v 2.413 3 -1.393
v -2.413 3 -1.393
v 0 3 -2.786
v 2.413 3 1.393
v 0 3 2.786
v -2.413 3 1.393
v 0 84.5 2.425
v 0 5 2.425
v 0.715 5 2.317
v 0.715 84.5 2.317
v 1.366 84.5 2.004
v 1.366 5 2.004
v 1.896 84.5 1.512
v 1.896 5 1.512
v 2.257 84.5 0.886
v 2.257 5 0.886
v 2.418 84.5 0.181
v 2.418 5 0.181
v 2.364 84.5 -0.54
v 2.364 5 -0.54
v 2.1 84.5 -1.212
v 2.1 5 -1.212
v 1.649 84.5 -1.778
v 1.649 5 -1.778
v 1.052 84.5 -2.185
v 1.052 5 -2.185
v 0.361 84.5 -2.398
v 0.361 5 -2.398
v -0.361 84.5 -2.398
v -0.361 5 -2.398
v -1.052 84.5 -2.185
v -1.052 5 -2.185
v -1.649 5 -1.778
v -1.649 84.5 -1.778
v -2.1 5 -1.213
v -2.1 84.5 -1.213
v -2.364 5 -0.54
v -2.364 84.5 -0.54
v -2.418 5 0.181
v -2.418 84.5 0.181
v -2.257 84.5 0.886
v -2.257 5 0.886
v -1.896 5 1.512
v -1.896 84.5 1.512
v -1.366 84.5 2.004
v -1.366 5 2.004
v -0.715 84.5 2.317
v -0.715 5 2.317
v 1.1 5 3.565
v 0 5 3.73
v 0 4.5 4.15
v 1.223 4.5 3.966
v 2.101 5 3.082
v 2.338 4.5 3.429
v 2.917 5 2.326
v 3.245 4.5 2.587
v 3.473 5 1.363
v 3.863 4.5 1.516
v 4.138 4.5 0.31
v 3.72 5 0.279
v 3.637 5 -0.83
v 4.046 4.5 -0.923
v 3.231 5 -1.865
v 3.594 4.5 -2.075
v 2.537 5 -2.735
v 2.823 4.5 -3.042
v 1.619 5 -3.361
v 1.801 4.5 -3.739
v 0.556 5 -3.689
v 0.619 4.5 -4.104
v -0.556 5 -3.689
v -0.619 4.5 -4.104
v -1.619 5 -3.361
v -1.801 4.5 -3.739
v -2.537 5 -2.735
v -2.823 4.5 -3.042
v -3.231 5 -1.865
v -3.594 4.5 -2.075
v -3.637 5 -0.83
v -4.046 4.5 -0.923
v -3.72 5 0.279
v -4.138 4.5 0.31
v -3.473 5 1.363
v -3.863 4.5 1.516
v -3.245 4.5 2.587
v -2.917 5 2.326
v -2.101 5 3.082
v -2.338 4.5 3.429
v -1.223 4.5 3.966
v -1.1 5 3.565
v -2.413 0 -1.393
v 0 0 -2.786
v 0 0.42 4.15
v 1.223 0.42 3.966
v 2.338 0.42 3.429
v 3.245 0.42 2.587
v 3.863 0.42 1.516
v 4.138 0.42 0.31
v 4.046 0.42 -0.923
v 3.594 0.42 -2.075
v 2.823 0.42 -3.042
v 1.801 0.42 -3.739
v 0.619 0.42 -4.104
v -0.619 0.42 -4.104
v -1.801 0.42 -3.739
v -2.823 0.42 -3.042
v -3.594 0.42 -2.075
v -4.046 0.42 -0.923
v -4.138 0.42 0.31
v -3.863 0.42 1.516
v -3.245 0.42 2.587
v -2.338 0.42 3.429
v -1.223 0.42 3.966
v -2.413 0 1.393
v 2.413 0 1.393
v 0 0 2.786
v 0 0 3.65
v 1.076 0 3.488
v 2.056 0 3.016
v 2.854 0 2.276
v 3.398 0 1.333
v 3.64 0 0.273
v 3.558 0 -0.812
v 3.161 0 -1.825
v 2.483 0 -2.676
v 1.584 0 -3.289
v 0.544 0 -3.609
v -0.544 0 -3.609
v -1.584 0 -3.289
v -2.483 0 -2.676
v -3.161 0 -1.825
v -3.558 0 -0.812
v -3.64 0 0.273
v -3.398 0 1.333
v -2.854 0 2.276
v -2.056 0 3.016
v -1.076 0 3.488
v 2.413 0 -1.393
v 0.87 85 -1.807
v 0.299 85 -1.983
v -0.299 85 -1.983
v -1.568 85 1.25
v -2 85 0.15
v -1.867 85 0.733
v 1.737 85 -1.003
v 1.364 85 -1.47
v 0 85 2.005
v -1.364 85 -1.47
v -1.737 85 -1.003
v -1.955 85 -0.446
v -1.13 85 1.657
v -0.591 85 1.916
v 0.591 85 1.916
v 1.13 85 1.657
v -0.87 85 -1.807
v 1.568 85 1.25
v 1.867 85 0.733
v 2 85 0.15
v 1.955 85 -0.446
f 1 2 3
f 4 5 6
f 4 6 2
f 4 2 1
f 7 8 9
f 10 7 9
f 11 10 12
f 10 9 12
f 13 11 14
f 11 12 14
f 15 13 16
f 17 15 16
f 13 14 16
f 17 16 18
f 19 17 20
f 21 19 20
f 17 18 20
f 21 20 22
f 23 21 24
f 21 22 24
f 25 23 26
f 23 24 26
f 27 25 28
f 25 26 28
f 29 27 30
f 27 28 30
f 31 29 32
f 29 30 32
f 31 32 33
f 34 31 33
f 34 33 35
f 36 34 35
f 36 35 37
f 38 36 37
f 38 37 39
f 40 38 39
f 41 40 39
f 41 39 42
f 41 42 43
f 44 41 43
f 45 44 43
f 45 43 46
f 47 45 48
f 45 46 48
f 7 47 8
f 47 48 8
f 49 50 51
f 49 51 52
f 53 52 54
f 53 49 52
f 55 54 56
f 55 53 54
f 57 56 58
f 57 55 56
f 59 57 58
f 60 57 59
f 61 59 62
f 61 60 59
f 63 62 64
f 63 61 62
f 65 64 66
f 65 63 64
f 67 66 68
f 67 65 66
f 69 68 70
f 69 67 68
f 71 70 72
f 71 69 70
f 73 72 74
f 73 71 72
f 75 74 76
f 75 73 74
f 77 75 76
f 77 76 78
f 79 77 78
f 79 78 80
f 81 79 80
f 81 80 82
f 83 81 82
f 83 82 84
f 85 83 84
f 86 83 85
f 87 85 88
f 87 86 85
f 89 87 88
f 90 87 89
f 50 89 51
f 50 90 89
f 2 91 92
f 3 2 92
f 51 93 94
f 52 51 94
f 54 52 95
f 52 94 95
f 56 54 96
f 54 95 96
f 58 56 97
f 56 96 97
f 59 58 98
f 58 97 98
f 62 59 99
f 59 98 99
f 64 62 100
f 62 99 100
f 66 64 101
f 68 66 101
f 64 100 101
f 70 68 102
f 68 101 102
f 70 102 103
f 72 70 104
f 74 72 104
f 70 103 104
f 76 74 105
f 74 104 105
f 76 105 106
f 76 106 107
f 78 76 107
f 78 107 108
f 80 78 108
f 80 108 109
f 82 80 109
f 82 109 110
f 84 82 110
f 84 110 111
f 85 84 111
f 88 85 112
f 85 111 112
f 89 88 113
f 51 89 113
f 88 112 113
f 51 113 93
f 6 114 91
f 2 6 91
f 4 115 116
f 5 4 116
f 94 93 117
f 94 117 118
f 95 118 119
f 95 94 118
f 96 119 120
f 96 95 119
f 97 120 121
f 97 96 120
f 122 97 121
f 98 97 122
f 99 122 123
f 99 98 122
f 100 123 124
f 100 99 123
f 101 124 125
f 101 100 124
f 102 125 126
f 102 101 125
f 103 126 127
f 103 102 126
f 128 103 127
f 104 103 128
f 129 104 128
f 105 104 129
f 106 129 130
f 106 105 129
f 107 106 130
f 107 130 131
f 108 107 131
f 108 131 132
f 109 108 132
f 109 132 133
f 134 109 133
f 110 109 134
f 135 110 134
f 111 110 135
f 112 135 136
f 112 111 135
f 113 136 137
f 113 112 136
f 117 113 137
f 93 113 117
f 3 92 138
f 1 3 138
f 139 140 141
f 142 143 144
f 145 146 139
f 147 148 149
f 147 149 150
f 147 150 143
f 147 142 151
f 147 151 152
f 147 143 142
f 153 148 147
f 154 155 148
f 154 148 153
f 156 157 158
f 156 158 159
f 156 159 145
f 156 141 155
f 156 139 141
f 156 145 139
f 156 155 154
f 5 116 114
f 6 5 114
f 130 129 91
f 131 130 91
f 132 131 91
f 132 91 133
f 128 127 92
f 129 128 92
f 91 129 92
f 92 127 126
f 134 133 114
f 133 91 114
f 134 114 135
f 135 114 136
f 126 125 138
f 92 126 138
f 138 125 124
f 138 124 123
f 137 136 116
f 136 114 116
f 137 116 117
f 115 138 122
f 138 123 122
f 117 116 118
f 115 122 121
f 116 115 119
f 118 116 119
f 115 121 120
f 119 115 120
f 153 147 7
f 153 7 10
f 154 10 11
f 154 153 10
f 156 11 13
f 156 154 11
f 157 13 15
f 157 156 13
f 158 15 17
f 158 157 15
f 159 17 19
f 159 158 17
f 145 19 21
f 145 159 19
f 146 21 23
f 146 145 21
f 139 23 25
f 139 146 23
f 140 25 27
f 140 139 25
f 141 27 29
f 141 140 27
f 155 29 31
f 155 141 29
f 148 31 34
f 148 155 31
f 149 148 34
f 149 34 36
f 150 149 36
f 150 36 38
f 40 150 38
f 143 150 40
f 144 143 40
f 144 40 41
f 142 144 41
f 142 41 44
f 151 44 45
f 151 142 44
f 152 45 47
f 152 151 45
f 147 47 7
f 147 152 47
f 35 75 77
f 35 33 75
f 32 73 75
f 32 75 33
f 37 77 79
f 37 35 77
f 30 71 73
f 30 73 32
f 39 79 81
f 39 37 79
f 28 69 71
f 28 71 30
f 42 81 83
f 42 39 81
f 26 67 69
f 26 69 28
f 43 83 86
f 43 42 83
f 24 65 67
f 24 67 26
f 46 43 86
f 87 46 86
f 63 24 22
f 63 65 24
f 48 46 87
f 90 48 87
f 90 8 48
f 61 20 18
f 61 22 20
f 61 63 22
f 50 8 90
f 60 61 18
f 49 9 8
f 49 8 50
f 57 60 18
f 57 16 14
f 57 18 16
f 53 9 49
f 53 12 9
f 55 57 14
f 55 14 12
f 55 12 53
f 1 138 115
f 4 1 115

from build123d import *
from OCP.BRepFilletAPI import BRepFilletAPI_MakeChamfer

# Parameters (mm, degrees)
SKETCH1_R           = 4.15
BOSS_EXTRUDE1_DEPTH = 5
SKETCH2_R           = 2.425
BOSS_EXTRUDE2_DEPTH = 80
CUT_EXTRUDE1_DEPTH  = 3
CHAMFER1_SIZE       = 0.5
CHAMFER1_SIZE2      = 0.419549816


with BuildPart() as part:
    # Sketch1 → Boss-Extrude1 (new body)
    with BuildSketch(Plane(origin=(0, 0, 0), x_dir=(1, 0, 0), z_dir=(0, 1, 0))):
        with Locations(Location((0, 0, 0), (0, 0, 270))):
            Circle(SKETCH1_R)
    extrude(amount=BOSS_EXTRUDE1_DEPTH)

    # Sketch2 → Boss-Extrude2 (add)
    with BuildSketch(Plane(origin=(0, 5, 0), x_dir=(1, 0, 0), z_dir=(0, 1, 0))):
        with Locations(Location((0, 0, 0), (0, 0, 270))):
            Circle(SKETCH2_R)
    extrude(amount=BOSS_EXTRUDE2_DEPTH)

    # Sketch3 → Cut-Extrude1 (cut)
    with BuildSketch(Plane.XZ):
        Polygon((0, 2.786041865), (-2.412783031, 1.393020932), (-2.412783031, -1.393020932), (0, -2.786041865), (2.412783031, -1.393020932), (2.412783031, 1.393020932), align=None)
    extrude(amount=-CUT_EXTRUDE1_DEPTH, mode=Mode.SUBTRACT)

    # Chamfer1: one chamfer whose edges measure the first distance from different faces: ONE call of the kernel's chamfer builder (chamfer() names one face for all edges)
    chamfer1_edges_1 = [part.edges().sort_by_distance(p)[0] for p in [
        (0, 0, -4.15),
    ]]
    chamfer1_side_1 = [part.faces().sort_by_distance(p)[0] for p in [
        (0, 0, -4.032620274),
    ]]
    chamfer1_edges_2 = [part.edges().sort_by_distance(p)[0] for p in [
        (0, 5, -4.15),
    ]]
    chamfer1_side_2 = [part.faces().sort_by_distance(p)[0] for p in [
        (0, 2.5, -4.15),
    ]]
    chamfer1_edges_3 = [part.edges().sort_by_distance(p)[0] for p in [
        (0, 85, -2.425),
    ]]
    chamfer1_side_3 = [part.faces().sort_by_distance(p)[0] for p in [
        (0, 45, -2.425),
    ]]
    chamfer1 = BRepFilletAPI_MakeChamfer(part.part.solid().wrapped)
    for e in chamfer1_edges_1:
        chamfer1.Add(CHAMFER1_SIZE, CHAMFER1_SIZE2, e.wrapped, chamfer1_side_1[0].wrapped)  # the first distance lies on this face
    for e in chamfer1_edges_2:
        chamfer1.Add(CHAMFER1_SIZE, CHAMFER1_SIZE2, e.wrapped, chamfer1_side_2[0].wrapped)  # the first distance lies on this face
    for e in chamfer1_edges_3:
        chamfer1.Add(CHAMFER1_SIZE, CHAMFER1_SIZE2, e.wrapped, chamfer1_side_3[0].wrapped)  # the first distance lies on this face
    add(Compound.cast(chamfer1.Shape()), mode=Mode.REPLACE)


solid = part.part
